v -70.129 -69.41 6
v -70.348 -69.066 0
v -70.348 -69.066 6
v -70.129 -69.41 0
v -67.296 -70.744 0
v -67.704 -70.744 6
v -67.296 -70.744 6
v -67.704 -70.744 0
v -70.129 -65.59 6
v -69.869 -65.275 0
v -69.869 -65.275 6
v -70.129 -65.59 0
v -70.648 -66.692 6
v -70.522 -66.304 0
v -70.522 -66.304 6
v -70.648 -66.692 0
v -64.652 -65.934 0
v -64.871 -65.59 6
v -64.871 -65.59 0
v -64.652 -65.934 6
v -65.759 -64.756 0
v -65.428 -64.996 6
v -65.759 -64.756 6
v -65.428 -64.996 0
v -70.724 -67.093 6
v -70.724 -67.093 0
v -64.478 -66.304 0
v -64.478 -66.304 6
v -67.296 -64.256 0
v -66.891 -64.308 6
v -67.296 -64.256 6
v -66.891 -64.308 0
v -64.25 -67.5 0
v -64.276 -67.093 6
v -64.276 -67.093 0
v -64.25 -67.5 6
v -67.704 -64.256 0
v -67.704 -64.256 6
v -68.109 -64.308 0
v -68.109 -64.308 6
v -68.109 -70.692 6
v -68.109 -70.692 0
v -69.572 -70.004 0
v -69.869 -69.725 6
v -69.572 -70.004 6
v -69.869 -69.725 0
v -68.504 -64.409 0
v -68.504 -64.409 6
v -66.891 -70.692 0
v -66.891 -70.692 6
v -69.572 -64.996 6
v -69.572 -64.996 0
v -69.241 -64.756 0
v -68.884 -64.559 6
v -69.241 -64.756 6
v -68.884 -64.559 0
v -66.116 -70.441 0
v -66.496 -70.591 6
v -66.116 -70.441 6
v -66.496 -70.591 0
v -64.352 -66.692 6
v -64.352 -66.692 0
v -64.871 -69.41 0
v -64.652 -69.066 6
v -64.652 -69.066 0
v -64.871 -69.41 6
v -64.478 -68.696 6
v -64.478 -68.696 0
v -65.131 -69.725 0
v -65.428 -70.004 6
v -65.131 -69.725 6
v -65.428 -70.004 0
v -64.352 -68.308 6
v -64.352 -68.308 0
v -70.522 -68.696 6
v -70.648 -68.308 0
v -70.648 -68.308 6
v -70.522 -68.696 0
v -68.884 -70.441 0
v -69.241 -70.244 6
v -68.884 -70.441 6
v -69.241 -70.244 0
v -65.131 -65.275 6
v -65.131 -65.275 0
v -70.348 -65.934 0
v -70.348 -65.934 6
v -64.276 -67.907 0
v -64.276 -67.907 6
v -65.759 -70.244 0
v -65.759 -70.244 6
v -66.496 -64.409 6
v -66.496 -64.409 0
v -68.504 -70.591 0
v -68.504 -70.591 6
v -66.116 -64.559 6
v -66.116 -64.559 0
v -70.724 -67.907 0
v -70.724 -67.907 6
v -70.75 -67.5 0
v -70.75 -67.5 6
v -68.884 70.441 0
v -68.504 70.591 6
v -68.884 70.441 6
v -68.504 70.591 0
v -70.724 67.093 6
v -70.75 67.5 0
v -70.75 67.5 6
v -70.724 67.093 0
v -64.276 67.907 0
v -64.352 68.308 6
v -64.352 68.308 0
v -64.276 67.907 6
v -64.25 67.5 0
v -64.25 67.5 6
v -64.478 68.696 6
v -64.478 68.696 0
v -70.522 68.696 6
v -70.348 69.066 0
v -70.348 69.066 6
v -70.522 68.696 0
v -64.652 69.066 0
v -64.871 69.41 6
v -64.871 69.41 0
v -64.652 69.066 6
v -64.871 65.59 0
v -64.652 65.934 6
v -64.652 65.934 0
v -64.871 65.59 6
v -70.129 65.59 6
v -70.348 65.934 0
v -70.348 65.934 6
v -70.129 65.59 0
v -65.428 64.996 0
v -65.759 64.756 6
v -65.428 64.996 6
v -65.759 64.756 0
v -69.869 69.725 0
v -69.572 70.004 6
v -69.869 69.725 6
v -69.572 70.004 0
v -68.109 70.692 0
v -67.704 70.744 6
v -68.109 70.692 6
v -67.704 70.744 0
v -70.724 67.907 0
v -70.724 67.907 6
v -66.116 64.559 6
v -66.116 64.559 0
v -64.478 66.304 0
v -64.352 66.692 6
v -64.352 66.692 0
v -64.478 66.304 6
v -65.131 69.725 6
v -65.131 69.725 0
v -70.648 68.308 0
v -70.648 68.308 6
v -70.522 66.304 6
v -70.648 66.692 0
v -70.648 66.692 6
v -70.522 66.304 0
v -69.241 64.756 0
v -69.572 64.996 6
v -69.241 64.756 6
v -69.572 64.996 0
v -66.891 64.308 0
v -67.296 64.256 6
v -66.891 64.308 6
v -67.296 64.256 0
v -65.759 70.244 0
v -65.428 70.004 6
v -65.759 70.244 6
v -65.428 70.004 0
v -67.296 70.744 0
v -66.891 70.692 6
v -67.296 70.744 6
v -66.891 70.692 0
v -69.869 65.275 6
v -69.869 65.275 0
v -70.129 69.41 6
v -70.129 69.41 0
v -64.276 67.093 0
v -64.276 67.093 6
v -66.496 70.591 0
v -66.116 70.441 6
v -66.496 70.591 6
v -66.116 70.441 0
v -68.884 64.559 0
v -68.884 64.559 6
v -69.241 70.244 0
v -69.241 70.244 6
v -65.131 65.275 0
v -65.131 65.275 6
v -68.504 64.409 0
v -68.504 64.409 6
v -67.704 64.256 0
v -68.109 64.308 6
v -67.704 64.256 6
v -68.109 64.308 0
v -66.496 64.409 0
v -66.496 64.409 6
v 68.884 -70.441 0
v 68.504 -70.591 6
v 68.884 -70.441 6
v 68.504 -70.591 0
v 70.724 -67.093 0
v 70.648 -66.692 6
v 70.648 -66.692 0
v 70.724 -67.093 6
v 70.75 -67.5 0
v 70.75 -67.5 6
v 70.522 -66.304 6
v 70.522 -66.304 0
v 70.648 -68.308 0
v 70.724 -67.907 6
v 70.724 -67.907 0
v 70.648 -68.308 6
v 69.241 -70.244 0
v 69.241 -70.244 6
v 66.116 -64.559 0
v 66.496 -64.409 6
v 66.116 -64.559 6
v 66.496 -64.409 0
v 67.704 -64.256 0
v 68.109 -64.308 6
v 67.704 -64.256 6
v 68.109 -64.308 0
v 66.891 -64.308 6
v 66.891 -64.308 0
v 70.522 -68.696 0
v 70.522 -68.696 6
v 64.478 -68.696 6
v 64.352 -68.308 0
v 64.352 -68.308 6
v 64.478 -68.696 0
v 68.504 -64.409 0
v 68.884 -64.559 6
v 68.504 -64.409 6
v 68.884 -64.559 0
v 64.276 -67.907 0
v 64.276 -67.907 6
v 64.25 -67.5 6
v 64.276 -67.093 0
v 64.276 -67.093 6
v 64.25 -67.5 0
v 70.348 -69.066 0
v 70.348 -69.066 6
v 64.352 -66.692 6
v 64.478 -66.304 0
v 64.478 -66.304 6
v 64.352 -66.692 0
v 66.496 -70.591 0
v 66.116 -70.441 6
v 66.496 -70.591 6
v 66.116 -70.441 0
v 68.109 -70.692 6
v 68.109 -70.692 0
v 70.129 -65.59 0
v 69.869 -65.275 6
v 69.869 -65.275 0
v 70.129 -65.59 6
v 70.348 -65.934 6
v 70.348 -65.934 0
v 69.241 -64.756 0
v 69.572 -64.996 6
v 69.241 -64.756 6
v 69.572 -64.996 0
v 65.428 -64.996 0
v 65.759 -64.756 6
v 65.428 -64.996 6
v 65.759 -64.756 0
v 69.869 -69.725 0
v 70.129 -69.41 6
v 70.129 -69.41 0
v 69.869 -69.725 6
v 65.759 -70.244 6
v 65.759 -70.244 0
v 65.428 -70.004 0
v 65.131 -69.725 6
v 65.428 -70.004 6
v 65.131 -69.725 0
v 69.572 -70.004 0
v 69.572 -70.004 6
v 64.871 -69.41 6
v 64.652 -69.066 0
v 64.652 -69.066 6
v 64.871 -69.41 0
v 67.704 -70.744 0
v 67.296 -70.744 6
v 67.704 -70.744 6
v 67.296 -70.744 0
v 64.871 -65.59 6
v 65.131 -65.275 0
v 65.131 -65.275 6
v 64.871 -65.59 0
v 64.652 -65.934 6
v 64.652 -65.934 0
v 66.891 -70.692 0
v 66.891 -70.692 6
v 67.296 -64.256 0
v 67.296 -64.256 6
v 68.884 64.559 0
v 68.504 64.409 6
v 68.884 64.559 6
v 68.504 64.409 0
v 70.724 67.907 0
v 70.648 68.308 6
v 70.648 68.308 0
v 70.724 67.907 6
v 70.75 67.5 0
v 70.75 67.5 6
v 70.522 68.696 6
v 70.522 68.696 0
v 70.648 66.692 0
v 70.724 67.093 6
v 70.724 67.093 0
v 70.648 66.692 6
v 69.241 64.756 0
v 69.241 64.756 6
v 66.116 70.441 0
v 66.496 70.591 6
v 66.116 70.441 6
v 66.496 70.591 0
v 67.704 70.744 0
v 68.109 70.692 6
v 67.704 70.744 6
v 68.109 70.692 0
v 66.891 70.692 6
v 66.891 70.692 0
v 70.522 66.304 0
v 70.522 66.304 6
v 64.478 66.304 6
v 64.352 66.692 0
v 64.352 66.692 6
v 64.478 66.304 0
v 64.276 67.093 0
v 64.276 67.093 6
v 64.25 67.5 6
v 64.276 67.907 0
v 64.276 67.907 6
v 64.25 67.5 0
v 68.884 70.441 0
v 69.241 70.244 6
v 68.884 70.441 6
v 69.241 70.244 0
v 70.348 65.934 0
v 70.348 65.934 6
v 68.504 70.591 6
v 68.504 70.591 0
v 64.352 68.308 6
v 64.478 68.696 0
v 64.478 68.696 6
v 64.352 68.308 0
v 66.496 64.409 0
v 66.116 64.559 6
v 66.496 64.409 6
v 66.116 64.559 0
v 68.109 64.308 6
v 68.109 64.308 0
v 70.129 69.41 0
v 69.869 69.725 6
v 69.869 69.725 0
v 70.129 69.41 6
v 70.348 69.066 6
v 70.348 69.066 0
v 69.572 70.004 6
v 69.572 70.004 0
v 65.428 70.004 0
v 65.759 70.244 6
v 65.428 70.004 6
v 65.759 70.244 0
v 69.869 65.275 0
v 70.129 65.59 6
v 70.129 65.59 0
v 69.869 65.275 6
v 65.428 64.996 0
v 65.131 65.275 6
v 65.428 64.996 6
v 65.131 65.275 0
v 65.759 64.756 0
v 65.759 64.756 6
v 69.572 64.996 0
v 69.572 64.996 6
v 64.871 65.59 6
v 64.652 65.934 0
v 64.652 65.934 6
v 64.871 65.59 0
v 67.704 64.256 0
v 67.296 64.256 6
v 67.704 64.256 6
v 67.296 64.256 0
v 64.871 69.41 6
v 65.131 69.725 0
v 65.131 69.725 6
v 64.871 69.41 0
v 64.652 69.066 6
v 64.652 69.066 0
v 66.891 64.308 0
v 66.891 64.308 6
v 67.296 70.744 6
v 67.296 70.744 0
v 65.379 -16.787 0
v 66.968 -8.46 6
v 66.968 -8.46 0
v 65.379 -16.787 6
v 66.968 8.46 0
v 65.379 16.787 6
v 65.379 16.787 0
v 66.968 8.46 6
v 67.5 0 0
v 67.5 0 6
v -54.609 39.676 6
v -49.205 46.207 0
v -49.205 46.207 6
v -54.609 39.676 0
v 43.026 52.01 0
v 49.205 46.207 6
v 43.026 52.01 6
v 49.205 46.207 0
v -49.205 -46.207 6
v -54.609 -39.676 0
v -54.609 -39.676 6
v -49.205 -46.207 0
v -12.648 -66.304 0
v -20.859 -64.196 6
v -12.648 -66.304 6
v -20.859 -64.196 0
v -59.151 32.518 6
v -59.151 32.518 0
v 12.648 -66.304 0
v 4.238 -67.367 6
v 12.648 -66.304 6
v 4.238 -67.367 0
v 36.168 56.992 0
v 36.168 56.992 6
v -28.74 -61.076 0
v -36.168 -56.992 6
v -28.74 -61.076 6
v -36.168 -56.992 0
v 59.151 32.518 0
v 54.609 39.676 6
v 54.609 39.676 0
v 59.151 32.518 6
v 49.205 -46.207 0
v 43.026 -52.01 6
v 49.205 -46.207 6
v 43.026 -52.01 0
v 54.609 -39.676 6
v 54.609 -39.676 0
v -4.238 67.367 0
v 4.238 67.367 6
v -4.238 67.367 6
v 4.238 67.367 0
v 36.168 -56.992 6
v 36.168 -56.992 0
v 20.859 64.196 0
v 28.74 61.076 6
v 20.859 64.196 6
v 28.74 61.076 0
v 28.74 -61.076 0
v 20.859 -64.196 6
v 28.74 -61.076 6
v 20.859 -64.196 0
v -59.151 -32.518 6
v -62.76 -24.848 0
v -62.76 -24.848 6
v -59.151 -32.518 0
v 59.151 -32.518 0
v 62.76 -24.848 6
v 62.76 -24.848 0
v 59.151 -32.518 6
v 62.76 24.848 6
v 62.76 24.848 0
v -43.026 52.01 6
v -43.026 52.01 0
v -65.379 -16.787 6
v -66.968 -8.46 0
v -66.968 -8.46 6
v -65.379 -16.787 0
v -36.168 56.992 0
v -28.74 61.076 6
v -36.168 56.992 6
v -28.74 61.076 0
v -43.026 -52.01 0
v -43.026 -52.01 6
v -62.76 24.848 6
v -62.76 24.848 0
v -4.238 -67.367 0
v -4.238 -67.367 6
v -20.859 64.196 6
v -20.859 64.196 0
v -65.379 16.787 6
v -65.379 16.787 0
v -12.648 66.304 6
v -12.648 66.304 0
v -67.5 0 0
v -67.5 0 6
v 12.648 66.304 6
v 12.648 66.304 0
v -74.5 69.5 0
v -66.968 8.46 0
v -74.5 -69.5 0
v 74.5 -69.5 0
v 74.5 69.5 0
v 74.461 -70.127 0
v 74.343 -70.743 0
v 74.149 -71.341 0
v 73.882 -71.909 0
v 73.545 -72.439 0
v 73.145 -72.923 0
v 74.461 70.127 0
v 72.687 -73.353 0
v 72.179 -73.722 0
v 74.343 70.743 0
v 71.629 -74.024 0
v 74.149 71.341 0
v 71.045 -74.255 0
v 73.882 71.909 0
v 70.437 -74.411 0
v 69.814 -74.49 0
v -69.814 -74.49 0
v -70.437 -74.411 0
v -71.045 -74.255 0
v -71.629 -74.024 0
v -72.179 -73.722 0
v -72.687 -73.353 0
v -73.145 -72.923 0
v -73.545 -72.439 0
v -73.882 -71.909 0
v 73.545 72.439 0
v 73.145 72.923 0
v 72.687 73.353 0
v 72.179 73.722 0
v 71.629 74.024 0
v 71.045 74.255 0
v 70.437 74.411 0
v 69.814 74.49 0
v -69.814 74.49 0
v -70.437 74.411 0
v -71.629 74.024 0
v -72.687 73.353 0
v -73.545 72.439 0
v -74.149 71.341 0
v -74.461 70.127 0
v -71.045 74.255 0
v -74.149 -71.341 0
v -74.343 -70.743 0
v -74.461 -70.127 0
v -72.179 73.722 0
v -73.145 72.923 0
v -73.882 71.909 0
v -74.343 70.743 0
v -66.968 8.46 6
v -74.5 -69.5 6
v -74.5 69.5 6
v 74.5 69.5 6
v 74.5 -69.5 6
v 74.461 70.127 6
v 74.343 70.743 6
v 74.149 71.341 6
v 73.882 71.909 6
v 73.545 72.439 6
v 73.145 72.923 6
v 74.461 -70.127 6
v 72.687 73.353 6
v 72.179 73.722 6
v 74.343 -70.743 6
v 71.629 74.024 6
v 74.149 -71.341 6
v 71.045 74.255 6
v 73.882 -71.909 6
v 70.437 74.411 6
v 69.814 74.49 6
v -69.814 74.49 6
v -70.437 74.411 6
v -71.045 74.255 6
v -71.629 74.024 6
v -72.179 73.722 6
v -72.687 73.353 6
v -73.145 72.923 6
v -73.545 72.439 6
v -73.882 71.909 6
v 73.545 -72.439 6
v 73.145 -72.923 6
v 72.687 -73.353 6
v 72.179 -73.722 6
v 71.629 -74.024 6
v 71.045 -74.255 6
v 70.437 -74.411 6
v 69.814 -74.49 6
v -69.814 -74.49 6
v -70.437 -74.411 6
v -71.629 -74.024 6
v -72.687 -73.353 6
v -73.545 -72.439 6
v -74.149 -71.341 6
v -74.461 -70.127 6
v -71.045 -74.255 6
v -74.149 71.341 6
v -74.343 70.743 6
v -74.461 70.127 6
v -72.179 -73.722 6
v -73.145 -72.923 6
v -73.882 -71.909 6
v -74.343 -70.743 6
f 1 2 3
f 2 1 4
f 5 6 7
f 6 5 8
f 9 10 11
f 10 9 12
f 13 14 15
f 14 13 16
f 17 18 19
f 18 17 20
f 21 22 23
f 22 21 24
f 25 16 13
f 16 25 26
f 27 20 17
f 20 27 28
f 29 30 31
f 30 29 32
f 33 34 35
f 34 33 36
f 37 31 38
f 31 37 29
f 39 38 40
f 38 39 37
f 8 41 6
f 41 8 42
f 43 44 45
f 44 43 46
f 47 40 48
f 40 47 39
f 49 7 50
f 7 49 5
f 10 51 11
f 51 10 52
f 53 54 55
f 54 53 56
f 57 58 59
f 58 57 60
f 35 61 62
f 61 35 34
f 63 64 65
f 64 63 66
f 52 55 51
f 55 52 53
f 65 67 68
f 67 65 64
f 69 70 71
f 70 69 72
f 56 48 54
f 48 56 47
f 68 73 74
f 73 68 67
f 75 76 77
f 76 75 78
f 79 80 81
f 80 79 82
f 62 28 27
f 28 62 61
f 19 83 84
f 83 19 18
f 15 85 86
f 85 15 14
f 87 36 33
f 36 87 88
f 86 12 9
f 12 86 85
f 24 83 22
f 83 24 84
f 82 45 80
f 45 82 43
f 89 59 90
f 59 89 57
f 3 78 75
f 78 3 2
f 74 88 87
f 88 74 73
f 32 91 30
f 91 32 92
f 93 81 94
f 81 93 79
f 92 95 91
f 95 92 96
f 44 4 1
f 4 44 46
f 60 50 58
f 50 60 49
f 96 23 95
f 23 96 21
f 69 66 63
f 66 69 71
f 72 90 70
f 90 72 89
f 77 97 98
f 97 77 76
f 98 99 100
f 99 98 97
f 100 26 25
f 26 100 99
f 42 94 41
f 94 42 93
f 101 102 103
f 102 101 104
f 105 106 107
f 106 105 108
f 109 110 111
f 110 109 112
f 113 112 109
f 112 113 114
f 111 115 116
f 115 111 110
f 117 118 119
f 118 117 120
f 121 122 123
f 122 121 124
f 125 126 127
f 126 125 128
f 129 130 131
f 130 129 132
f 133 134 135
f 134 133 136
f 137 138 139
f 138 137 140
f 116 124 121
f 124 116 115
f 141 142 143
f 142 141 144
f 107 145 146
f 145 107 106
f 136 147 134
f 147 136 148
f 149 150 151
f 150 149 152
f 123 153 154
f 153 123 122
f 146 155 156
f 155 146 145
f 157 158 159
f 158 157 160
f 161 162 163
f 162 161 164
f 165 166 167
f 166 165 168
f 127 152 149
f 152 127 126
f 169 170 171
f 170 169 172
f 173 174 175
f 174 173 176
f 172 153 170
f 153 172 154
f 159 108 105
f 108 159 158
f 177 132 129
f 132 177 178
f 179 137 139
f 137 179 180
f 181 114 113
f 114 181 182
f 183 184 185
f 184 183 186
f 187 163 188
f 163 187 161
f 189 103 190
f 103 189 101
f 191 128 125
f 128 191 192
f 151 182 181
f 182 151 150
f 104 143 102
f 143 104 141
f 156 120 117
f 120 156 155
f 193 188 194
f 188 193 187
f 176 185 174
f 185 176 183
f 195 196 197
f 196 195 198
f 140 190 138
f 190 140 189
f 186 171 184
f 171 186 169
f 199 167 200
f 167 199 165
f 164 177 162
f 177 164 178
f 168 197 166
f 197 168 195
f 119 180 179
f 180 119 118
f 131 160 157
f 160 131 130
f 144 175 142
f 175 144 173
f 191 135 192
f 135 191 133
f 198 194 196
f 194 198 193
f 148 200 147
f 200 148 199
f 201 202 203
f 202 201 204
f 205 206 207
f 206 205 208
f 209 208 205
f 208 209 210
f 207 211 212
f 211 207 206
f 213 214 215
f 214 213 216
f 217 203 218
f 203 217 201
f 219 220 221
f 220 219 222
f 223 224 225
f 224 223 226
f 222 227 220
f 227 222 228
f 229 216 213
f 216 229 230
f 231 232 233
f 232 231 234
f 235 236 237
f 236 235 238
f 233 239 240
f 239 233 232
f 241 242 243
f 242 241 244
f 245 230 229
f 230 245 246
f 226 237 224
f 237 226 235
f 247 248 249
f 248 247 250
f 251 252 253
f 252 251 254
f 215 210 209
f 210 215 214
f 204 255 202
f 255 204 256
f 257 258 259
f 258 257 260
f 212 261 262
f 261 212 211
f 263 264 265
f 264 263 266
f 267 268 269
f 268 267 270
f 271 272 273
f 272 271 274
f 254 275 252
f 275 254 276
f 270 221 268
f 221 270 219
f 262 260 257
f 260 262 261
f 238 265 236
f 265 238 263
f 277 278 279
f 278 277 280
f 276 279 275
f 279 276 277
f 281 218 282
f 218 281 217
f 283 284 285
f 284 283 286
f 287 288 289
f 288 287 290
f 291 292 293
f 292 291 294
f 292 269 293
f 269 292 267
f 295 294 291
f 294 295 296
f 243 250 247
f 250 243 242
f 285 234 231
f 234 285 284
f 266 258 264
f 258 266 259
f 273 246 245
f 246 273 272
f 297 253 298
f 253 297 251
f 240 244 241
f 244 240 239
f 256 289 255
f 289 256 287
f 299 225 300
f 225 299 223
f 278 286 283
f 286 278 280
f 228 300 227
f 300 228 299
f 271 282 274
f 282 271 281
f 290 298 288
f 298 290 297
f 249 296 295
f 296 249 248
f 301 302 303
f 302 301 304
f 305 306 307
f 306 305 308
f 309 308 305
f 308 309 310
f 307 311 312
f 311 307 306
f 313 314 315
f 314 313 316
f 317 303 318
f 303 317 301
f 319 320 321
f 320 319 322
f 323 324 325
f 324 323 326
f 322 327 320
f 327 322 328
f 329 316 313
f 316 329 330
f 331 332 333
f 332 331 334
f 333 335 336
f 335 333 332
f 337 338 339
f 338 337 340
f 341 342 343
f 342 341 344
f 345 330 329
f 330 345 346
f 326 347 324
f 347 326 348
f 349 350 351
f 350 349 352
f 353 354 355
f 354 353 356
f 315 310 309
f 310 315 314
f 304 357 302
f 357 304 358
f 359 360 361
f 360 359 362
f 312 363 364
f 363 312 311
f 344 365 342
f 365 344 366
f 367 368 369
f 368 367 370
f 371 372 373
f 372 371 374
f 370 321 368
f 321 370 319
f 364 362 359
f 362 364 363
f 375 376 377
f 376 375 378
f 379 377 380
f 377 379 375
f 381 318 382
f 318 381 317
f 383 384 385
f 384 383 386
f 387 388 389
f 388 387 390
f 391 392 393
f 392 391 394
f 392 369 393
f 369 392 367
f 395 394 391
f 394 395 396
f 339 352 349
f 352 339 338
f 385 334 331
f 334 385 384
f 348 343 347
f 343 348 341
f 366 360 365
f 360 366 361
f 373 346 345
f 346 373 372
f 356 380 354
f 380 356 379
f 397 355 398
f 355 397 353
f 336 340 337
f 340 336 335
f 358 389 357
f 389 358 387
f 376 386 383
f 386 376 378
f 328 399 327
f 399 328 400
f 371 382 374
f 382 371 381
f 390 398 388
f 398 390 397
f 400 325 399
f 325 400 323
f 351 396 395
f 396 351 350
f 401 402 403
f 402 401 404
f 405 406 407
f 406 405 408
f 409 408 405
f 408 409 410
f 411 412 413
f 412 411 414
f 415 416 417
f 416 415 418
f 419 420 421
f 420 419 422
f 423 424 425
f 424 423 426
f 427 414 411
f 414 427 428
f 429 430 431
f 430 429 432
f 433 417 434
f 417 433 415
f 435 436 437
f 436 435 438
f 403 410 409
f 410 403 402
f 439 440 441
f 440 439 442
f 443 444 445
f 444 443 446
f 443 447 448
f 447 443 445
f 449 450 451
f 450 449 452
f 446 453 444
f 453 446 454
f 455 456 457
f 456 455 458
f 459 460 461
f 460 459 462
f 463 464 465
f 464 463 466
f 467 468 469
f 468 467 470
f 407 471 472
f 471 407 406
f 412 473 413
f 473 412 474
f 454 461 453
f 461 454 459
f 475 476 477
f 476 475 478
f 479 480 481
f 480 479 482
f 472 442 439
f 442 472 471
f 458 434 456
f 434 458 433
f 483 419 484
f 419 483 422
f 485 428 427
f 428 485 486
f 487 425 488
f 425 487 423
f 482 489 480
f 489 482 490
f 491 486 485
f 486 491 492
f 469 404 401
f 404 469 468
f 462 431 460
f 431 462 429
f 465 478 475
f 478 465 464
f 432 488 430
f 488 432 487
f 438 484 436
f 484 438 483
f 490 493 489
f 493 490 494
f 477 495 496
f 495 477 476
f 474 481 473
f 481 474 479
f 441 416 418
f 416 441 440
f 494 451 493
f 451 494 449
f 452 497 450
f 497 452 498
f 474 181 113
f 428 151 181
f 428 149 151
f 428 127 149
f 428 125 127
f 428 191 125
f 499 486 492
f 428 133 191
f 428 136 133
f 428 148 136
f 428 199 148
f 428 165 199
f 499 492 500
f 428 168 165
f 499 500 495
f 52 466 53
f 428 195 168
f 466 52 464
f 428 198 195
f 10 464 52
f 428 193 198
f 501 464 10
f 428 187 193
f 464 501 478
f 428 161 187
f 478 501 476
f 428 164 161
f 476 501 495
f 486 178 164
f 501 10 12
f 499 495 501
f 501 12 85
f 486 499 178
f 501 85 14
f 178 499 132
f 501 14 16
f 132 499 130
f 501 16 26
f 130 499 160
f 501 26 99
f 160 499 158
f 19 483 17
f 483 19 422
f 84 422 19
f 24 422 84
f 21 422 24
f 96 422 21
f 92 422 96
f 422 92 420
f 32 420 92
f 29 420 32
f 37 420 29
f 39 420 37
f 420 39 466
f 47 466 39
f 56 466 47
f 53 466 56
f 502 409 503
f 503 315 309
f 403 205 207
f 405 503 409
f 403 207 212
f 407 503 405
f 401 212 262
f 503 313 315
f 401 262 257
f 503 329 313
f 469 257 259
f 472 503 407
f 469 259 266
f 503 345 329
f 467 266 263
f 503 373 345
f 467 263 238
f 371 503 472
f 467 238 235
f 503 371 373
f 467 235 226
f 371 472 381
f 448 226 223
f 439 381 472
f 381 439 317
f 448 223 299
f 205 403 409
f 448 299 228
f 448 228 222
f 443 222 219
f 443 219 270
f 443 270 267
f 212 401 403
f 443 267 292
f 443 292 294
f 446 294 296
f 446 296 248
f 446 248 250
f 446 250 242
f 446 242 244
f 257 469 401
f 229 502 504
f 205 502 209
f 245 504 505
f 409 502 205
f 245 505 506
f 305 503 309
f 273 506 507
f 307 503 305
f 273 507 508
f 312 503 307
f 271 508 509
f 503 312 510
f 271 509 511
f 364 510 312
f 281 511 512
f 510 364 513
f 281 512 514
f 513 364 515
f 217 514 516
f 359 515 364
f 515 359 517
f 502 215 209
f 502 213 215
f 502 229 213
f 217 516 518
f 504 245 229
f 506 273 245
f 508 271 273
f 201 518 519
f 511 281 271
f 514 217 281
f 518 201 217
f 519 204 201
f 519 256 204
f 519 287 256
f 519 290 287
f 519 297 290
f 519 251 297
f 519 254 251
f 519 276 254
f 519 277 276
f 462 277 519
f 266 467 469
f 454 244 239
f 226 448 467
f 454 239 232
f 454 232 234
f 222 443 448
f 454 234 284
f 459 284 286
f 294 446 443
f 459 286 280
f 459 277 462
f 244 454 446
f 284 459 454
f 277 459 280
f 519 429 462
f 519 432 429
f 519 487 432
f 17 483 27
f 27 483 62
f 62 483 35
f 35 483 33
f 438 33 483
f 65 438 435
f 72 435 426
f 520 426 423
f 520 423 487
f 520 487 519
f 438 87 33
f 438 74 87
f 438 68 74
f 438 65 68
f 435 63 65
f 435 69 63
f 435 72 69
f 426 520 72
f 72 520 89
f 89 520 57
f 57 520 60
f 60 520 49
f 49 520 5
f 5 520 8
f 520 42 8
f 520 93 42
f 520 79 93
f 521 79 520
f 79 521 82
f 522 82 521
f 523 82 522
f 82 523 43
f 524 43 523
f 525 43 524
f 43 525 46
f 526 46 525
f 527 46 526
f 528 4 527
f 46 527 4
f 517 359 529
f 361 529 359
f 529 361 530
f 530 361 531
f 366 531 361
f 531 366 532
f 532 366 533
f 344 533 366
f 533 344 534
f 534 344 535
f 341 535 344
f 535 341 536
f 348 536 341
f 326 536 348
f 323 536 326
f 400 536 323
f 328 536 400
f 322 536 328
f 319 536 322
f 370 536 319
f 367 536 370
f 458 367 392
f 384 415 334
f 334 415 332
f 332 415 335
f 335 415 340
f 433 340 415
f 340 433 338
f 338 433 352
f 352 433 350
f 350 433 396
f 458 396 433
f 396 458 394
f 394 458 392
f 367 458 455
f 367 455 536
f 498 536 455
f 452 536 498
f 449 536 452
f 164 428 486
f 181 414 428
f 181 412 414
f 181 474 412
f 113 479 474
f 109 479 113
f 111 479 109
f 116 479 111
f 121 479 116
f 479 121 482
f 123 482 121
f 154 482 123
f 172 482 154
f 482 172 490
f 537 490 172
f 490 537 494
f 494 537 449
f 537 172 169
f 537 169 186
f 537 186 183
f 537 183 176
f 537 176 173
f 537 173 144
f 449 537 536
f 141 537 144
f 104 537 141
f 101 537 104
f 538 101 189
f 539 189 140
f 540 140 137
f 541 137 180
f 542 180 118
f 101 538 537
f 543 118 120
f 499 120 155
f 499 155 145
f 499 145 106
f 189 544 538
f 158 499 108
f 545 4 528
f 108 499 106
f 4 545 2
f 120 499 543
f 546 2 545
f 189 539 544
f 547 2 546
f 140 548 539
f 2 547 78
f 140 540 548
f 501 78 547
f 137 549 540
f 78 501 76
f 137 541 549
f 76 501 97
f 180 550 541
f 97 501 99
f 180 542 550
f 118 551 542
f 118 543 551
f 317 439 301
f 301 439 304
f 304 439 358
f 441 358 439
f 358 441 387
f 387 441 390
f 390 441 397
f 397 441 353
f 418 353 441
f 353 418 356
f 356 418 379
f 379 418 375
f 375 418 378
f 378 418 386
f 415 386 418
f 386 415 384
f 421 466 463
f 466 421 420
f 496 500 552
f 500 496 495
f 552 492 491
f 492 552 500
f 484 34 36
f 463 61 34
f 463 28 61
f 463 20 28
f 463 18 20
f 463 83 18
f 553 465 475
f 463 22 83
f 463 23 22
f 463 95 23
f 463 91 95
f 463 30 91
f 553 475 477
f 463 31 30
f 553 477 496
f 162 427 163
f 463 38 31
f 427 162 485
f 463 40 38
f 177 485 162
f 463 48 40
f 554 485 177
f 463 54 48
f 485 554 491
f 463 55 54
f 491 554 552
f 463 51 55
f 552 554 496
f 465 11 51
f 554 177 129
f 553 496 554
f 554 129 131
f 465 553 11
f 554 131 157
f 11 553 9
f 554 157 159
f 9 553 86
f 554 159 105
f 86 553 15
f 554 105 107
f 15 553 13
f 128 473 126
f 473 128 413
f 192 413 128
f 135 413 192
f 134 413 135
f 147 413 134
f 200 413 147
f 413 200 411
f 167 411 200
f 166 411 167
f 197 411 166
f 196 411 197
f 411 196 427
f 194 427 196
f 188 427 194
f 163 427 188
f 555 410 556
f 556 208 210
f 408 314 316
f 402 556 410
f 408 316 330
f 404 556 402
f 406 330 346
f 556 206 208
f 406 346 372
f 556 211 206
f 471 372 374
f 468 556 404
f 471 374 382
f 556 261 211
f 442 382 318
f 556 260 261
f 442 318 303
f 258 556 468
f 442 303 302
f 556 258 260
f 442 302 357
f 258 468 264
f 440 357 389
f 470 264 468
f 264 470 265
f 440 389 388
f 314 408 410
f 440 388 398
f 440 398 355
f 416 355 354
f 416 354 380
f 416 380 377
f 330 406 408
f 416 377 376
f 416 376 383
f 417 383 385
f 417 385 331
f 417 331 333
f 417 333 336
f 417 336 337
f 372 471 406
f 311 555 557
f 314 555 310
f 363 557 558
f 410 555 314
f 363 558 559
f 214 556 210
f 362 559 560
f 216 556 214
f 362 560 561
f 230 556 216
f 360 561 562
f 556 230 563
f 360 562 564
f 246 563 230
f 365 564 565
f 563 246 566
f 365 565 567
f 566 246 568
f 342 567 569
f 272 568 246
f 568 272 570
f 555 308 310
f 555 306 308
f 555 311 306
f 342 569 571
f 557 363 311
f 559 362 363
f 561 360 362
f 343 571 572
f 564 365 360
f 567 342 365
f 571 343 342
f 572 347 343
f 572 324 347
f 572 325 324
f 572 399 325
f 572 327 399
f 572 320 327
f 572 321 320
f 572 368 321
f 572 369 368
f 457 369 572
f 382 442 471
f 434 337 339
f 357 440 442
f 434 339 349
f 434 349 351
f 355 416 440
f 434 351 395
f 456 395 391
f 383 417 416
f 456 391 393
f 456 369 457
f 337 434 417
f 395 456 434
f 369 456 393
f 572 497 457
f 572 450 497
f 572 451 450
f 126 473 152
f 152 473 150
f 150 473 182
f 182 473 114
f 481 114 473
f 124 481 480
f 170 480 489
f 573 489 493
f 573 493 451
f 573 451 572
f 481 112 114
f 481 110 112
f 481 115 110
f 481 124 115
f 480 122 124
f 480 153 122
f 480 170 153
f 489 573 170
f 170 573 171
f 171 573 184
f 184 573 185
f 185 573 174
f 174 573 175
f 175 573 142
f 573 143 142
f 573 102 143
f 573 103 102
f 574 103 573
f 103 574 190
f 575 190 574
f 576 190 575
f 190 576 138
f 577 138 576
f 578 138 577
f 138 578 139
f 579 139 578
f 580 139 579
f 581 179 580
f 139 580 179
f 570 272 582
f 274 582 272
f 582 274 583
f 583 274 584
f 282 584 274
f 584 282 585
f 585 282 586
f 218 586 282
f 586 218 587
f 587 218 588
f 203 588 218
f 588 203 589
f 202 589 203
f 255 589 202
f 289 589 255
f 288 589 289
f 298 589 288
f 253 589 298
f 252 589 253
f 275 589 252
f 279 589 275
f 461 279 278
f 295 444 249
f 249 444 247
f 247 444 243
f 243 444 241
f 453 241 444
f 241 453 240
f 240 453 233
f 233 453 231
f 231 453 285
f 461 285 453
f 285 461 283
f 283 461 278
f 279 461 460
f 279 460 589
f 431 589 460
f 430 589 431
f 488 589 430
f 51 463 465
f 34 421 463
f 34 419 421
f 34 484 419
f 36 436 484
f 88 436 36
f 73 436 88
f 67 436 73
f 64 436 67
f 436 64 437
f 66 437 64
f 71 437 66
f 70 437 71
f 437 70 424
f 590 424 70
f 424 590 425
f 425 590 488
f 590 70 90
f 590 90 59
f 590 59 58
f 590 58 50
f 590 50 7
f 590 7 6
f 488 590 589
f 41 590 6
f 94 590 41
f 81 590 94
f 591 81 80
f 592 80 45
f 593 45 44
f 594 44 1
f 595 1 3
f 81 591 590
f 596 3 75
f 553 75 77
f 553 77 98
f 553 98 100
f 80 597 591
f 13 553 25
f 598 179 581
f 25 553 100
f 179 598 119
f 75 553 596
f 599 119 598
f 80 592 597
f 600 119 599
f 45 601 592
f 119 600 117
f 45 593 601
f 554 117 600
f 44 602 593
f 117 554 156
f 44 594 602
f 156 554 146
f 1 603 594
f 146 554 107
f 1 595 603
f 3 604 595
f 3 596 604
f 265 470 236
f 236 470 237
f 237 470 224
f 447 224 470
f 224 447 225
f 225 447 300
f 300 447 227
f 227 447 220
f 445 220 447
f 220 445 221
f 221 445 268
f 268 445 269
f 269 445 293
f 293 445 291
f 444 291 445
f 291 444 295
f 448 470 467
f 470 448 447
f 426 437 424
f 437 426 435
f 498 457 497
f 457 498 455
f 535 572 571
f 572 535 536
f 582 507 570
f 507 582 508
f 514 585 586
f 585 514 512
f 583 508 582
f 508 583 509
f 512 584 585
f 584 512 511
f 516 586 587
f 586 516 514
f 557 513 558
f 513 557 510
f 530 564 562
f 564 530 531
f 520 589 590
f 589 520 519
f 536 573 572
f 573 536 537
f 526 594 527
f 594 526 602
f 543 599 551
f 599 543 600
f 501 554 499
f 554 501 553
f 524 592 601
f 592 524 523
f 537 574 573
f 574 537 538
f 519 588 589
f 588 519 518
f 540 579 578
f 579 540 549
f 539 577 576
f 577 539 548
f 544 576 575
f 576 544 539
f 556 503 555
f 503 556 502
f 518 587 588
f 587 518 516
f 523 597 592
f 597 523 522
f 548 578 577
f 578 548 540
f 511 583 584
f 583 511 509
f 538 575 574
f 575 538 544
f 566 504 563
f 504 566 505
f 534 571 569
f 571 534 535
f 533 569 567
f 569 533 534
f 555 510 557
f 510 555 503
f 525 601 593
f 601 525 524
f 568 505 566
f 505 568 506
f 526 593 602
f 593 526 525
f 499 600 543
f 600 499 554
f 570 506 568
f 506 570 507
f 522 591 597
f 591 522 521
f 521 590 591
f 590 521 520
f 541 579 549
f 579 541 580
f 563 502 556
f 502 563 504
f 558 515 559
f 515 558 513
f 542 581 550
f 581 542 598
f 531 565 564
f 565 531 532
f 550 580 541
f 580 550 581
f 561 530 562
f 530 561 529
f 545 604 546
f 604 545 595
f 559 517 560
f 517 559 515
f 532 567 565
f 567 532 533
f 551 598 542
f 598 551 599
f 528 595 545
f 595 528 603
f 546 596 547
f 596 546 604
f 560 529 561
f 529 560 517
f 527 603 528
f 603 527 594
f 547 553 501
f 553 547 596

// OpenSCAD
$fn = 50;


difference() {
	union() {
		hull() {
			translate(v = [-69.5000000000, 69.5000000000, 0]) {
				cylinder(h = 6, r = 5);
			}
			translate(v = [69.5000000000, 69.5000000000, 0]) {
				cylinder(h = 6, r = 5);
			}
			translate(v = [-69.5000000000, -69.5000000000, 0]) {
				cylinder(h = 6, r = 5);
			}
			translate(v = [69.5000000000, -69.5000000000, 0]) {
				cylinder(h = 6, r = 5);
			}
		}
	}
	union() {
		#translate(v = [-67.5000000000, -67.5000000000, -100.0000000000]) {
			cylinder(h = 200, r = 3.2500000000);
		}
		#translate(v = [-67.5000000000, 67.5000000000, -100.0000000000]) {
			cylinder(h = 200, r = 3.2500000000);
		}
		#translate(v = [67.5000000000, -67.5000000000, -100.0000000000]) {
			cylinder(h = 200, r = 3.2500000000);
		}
		#translate(v = [67.5000000000, 67.5000000000, -100.0000000000]) {
			cylinder(h = 200, r = 3.2500000000);
		}
		#cylinder(h = 6, r = 67.5000000000);
	}
}
